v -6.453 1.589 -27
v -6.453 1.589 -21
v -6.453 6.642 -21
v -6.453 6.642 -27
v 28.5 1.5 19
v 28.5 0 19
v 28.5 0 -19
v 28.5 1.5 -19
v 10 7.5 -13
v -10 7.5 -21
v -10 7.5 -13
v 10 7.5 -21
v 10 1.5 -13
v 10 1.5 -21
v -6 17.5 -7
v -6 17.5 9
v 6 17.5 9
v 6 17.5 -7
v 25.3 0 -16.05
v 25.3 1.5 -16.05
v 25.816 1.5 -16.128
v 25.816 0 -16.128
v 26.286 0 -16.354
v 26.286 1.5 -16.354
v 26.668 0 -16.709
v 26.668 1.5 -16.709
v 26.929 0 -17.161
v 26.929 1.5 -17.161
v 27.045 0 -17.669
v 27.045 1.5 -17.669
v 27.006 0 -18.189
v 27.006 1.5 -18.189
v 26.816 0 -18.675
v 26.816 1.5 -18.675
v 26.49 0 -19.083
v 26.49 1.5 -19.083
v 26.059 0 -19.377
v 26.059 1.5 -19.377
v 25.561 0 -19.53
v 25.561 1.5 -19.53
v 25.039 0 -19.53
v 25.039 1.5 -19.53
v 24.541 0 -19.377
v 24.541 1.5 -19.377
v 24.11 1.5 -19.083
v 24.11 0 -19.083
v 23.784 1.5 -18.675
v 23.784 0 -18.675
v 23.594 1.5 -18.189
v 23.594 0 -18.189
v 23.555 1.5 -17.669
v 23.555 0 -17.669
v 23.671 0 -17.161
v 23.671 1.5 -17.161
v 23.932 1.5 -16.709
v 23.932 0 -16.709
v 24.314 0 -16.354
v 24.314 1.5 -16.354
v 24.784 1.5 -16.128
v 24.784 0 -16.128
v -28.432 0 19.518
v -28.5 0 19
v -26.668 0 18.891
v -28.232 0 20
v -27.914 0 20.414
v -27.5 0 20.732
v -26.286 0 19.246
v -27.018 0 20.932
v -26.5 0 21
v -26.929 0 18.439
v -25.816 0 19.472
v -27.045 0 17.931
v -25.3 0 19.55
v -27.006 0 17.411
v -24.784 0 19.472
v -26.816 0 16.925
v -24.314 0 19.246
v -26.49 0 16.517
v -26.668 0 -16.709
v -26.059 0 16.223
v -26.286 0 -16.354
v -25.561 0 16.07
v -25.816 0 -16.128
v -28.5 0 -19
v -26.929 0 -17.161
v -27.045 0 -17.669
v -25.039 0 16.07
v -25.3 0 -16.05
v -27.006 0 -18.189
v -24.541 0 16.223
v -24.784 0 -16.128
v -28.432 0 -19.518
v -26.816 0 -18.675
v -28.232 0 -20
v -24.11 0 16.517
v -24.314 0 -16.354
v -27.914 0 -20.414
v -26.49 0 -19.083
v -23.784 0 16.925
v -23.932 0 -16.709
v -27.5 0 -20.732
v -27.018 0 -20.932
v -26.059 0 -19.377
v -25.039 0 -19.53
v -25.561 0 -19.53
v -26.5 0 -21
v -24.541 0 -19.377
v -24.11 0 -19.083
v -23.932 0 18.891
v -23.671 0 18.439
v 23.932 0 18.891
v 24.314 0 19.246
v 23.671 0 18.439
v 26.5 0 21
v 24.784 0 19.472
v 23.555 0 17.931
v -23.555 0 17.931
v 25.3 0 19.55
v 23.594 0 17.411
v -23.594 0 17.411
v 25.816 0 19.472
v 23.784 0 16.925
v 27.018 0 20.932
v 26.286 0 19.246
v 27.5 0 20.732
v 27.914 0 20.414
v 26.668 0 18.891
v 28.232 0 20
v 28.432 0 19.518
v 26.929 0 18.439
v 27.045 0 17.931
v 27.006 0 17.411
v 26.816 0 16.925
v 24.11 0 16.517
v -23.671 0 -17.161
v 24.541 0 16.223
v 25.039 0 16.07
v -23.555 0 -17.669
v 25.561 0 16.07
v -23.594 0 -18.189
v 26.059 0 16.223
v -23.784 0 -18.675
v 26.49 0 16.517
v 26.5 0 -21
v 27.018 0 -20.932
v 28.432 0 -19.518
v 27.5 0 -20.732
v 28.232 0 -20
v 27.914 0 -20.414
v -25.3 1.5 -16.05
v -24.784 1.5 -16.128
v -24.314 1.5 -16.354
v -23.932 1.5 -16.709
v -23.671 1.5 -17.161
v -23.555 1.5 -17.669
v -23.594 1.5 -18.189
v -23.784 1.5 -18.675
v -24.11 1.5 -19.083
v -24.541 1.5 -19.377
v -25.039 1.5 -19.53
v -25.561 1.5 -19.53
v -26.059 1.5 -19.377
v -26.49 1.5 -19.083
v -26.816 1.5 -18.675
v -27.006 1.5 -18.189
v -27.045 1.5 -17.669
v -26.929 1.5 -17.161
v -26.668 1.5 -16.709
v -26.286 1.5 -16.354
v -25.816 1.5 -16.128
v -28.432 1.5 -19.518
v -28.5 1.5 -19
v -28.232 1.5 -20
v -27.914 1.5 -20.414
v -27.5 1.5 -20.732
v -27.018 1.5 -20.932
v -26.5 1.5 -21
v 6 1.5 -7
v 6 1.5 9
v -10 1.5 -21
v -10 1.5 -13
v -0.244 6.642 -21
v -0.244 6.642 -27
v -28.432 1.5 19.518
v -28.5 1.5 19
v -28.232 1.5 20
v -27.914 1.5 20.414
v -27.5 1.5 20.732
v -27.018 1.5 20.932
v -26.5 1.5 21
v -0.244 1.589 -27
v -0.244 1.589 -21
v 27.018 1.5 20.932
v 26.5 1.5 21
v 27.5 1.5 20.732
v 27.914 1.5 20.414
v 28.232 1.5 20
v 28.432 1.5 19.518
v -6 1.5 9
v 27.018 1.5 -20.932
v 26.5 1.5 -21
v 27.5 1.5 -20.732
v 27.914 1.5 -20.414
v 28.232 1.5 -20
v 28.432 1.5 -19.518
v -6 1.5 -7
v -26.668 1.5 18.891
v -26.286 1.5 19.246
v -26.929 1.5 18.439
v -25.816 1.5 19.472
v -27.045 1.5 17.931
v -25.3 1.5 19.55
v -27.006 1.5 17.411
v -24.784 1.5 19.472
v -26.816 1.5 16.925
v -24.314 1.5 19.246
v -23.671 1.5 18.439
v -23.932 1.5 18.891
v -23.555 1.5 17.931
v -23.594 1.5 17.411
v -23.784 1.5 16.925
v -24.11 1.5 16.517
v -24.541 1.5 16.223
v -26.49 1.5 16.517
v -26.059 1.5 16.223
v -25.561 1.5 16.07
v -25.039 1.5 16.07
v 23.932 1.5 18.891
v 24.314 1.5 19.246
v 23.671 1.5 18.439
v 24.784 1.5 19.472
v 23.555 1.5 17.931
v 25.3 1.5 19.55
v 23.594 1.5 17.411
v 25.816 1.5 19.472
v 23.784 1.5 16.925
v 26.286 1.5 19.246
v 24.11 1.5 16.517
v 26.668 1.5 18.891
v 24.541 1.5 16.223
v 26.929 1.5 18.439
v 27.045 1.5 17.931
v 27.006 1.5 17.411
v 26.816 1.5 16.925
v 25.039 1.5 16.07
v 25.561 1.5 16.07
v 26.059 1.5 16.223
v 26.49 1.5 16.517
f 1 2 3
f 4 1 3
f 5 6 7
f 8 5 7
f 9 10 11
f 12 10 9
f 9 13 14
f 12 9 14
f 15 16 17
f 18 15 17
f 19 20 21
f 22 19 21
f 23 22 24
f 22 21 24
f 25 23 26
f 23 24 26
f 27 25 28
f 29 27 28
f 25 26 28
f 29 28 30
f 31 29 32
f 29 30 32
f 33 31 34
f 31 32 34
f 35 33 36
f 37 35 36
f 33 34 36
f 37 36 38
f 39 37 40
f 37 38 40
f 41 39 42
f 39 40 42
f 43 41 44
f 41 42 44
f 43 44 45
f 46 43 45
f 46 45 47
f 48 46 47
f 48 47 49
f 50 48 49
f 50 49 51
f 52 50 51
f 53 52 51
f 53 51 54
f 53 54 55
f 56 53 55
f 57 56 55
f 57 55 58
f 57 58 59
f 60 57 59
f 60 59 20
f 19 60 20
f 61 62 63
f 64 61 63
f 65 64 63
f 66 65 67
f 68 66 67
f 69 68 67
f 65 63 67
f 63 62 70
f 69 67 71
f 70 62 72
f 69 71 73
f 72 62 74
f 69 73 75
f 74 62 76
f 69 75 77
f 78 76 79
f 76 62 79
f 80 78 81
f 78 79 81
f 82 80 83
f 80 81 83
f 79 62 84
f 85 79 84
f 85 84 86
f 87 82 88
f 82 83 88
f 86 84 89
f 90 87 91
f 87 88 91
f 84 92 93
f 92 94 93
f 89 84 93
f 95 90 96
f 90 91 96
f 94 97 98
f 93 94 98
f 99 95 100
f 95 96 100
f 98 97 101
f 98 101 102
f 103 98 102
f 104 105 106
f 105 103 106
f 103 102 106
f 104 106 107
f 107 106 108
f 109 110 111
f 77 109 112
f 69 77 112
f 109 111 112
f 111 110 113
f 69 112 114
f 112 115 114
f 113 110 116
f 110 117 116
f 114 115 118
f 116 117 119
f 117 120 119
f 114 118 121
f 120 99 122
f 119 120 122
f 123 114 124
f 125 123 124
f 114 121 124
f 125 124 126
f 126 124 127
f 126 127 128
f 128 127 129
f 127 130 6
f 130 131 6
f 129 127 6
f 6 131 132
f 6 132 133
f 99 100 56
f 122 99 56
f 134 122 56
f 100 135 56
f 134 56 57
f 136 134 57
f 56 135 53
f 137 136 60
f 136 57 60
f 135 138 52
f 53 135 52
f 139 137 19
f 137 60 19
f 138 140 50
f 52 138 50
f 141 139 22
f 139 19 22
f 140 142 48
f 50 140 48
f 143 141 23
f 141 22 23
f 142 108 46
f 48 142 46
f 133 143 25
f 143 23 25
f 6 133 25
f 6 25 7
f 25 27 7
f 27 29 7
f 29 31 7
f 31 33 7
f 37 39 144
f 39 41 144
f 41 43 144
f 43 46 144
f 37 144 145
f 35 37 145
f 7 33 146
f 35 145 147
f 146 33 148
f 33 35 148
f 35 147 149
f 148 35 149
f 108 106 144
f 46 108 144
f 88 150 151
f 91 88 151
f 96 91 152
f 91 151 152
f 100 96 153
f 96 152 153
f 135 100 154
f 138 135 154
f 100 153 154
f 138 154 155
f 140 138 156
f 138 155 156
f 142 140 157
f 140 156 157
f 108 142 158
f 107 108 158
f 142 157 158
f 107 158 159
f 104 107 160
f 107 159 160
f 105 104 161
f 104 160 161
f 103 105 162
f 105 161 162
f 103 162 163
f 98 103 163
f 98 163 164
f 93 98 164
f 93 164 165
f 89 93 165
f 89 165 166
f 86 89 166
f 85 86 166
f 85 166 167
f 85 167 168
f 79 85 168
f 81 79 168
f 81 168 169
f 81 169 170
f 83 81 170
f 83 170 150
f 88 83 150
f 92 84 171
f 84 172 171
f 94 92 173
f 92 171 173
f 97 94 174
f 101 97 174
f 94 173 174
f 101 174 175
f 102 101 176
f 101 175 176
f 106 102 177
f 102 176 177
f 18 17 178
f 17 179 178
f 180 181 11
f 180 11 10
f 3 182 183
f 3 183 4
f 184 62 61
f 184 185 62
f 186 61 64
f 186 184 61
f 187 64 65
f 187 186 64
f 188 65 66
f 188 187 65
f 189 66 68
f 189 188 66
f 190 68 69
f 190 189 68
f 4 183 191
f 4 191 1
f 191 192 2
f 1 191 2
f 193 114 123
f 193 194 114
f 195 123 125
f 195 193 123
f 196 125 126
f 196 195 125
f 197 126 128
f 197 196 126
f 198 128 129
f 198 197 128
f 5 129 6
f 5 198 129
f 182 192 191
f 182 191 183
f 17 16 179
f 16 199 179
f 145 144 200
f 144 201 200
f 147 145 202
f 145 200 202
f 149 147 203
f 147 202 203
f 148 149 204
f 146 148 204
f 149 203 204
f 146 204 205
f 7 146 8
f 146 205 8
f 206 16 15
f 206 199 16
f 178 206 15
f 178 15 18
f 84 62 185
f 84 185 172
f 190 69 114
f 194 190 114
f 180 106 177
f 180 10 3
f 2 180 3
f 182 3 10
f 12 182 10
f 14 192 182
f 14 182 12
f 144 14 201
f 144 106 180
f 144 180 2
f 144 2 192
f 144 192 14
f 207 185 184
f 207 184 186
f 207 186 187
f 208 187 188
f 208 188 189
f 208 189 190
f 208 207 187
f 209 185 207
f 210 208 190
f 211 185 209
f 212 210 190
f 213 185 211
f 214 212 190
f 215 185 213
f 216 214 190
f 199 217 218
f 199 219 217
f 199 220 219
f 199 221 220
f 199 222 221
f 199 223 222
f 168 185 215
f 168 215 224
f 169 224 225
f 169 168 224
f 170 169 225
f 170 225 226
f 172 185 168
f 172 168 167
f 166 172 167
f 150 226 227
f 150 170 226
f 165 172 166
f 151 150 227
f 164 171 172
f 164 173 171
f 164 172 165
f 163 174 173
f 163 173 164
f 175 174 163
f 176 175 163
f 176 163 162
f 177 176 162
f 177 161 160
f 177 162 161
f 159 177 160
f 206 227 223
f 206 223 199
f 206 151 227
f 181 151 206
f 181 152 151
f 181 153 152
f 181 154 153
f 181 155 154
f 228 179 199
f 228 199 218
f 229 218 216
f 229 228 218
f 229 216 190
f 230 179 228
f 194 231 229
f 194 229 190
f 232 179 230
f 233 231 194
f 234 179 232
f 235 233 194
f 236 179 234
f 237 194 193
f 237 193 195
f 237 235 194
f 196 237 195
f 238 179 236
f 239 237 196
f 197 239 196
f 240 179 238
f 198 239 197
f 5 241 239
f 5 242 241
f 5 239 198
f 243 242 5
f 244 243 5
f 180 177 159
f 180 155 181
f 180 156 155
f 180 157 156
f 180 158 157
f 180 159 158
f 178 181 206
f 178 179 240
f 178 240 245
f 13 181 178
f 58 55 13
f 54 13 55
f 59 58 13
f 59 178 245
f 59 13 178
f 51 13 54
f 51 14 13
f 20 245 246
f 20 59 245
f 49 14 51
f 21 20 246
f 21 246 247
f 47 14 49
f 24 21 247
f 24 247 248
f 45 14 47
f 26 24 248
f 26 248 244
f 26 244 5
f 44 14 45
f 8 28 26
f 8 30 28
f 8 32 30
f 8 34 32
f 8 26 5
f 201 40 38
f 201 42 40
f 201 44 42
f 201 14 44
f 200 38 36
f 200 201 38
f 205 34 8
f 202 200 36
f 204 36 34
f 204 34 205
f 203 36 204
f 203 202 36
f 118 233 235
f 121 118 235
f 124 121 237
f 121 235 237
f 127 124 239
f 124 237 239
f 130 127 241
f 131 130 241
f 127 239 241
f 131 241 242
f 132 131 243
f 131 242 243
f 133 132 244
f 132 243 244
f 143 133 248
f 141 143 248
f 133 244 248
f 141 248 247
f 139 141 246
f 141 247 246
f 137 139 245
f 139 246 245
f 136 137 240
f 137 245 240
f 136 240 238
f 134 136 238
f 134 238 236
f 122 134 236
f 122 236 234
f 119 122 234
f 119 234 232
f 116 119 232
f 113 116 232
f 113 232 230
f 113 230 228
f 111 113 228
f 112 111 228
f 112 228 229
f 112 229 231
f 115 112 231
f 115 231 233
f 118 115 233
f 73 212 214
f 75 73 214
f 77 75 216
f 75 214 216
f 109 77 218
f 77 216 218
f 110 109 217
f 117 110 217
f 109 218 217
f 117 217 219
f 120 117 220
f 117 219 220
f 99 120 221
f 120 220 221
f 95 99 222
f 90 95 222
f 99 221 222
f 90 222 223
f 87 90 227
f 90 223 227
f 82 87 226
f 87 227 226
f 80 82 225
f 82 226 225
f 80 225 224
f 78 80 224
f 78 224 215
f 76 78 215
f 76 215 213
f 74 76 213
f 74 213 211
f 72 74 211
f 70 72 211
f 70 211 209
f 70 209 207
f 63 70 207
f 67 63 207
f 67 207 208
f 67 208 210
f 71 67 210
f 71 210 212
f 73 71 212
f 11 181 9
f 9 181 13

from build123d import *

# Parameters (mm, degrees)
SKETCH1_W           = 57
SKETCH1_H           = 42
BOSS_EXTRUDE1_DEPTH = 1.5
SKETCH2_R           = 1.75
CUT_EXTRUDE1_DEPTH  = 10
SKETCH3_W           = 12
SKETCH3_H           = 16
SKETCH3_W_2         = 20
SKETCH3_H_2         = 8
BOSS_EXTRUDE2_DEPTH = 6
SKETCH4_W           = 6.209741393
SKETCH4_H           = 5.053024859
BOSS_EXTRUDE3_DEPTH = 6
FILLET3_R           = 2
SKETCH7_W           = 12
SKETCH7_H           = 16
BOSS_EXTRUDE6_DEPTH = 10


with BuildPart() as part:
    # Sketch1 → Boss-Extrude1 (new body)
    with BuildSketch(Plane(origin=(0, 0, 0), x_dir=(1, 0, 0), z_dir=(0, 1, 0))):
        Rectangle(SKETCH1_W, SKETCH1_H)
    extrude(amount=BOSS_EXTRUDE1_DEPTH)

    # Sketch2 → Cut-Extrude1 (cut)
    with BuildSketch(Plane(origin=(0, 1.5, 0), x_dir=(1, 0, 0), z_dir=(0, 1, 0))):
        with Locations(Location((-25.3, 17.8, 0), (0, 0, 270))):
            Circle(SKETCH2_R)
        with Locations(Location((-25.3, -17.8, 0), (0, 0, 270))):
            Circle(SKETCH2_R)
        with Locations(Location((25.3, -17.8, 0), (0, 0, 270))):
            Circle(SKETCH2_R)
        with Locations(Location((25.3, 17.8, 0), (0, 0, 270))):
            Circle(SKETCH2_R)
    extrude(amount=-CUT_EXTRUDE1_DEPTH, mode=Mode.SUBTRACT)

    # Sketch3 → Boss-Extrude2 (add)
    with BuildSketch(Plane(origin=(0, 1.5, 0), x_dir=(1, 0, 0), z_dir=(0, 1, 0))):
        with Locations((0, -1)):
            Rectangle(SKETCH3_W, SKETCH3_H)
        with Locations((0, 17)):
            Rectangle(SKETCH3_W_2, SKETCH3_H_2)
    extrude(amount=BOSS_EXTRUDE2_DEPTH)

    # Sketch4 → Boss-Extrude3 (add)
    with BuildSketch(Plane(origin=(0, 0, -21), x_dir=(-1, 0, 0), z_dir=(0, 0, -1))):
        with Locations((3.348389967, 4.115278906)):
            Rectangle(SKETCH4_W, SKETCH4_H)
    extrude(amount=BOSS_EXTRUDE3_DEPTH)

    # Fillet3
    fillet3_edges = [part.edges().sort_by_distance(p)[0] for p in [
        (28.5, 0.75, 21),
        (-28.5, 0.75, 21),
        (-28.5, 0.75, -21),
        (28.5, 0.75, -21),
    ]]
    fillet(fillet3_edges, radius=FILLET3_R)

    # Sketch7 → Boss-Extrude6 (add)
    with BuildSketch(Plane(origin=(0, 7.5, 0), x_dir=(1, 0, 0), z_dir=(0, 1, 0))):
        with Locations((0, -1)):
            Rectangle(SKETCH7_W, SKETCH7_H)
    extrude(amount=BOSS_EXTRUDE6_DEPTH)


solid = part.part
